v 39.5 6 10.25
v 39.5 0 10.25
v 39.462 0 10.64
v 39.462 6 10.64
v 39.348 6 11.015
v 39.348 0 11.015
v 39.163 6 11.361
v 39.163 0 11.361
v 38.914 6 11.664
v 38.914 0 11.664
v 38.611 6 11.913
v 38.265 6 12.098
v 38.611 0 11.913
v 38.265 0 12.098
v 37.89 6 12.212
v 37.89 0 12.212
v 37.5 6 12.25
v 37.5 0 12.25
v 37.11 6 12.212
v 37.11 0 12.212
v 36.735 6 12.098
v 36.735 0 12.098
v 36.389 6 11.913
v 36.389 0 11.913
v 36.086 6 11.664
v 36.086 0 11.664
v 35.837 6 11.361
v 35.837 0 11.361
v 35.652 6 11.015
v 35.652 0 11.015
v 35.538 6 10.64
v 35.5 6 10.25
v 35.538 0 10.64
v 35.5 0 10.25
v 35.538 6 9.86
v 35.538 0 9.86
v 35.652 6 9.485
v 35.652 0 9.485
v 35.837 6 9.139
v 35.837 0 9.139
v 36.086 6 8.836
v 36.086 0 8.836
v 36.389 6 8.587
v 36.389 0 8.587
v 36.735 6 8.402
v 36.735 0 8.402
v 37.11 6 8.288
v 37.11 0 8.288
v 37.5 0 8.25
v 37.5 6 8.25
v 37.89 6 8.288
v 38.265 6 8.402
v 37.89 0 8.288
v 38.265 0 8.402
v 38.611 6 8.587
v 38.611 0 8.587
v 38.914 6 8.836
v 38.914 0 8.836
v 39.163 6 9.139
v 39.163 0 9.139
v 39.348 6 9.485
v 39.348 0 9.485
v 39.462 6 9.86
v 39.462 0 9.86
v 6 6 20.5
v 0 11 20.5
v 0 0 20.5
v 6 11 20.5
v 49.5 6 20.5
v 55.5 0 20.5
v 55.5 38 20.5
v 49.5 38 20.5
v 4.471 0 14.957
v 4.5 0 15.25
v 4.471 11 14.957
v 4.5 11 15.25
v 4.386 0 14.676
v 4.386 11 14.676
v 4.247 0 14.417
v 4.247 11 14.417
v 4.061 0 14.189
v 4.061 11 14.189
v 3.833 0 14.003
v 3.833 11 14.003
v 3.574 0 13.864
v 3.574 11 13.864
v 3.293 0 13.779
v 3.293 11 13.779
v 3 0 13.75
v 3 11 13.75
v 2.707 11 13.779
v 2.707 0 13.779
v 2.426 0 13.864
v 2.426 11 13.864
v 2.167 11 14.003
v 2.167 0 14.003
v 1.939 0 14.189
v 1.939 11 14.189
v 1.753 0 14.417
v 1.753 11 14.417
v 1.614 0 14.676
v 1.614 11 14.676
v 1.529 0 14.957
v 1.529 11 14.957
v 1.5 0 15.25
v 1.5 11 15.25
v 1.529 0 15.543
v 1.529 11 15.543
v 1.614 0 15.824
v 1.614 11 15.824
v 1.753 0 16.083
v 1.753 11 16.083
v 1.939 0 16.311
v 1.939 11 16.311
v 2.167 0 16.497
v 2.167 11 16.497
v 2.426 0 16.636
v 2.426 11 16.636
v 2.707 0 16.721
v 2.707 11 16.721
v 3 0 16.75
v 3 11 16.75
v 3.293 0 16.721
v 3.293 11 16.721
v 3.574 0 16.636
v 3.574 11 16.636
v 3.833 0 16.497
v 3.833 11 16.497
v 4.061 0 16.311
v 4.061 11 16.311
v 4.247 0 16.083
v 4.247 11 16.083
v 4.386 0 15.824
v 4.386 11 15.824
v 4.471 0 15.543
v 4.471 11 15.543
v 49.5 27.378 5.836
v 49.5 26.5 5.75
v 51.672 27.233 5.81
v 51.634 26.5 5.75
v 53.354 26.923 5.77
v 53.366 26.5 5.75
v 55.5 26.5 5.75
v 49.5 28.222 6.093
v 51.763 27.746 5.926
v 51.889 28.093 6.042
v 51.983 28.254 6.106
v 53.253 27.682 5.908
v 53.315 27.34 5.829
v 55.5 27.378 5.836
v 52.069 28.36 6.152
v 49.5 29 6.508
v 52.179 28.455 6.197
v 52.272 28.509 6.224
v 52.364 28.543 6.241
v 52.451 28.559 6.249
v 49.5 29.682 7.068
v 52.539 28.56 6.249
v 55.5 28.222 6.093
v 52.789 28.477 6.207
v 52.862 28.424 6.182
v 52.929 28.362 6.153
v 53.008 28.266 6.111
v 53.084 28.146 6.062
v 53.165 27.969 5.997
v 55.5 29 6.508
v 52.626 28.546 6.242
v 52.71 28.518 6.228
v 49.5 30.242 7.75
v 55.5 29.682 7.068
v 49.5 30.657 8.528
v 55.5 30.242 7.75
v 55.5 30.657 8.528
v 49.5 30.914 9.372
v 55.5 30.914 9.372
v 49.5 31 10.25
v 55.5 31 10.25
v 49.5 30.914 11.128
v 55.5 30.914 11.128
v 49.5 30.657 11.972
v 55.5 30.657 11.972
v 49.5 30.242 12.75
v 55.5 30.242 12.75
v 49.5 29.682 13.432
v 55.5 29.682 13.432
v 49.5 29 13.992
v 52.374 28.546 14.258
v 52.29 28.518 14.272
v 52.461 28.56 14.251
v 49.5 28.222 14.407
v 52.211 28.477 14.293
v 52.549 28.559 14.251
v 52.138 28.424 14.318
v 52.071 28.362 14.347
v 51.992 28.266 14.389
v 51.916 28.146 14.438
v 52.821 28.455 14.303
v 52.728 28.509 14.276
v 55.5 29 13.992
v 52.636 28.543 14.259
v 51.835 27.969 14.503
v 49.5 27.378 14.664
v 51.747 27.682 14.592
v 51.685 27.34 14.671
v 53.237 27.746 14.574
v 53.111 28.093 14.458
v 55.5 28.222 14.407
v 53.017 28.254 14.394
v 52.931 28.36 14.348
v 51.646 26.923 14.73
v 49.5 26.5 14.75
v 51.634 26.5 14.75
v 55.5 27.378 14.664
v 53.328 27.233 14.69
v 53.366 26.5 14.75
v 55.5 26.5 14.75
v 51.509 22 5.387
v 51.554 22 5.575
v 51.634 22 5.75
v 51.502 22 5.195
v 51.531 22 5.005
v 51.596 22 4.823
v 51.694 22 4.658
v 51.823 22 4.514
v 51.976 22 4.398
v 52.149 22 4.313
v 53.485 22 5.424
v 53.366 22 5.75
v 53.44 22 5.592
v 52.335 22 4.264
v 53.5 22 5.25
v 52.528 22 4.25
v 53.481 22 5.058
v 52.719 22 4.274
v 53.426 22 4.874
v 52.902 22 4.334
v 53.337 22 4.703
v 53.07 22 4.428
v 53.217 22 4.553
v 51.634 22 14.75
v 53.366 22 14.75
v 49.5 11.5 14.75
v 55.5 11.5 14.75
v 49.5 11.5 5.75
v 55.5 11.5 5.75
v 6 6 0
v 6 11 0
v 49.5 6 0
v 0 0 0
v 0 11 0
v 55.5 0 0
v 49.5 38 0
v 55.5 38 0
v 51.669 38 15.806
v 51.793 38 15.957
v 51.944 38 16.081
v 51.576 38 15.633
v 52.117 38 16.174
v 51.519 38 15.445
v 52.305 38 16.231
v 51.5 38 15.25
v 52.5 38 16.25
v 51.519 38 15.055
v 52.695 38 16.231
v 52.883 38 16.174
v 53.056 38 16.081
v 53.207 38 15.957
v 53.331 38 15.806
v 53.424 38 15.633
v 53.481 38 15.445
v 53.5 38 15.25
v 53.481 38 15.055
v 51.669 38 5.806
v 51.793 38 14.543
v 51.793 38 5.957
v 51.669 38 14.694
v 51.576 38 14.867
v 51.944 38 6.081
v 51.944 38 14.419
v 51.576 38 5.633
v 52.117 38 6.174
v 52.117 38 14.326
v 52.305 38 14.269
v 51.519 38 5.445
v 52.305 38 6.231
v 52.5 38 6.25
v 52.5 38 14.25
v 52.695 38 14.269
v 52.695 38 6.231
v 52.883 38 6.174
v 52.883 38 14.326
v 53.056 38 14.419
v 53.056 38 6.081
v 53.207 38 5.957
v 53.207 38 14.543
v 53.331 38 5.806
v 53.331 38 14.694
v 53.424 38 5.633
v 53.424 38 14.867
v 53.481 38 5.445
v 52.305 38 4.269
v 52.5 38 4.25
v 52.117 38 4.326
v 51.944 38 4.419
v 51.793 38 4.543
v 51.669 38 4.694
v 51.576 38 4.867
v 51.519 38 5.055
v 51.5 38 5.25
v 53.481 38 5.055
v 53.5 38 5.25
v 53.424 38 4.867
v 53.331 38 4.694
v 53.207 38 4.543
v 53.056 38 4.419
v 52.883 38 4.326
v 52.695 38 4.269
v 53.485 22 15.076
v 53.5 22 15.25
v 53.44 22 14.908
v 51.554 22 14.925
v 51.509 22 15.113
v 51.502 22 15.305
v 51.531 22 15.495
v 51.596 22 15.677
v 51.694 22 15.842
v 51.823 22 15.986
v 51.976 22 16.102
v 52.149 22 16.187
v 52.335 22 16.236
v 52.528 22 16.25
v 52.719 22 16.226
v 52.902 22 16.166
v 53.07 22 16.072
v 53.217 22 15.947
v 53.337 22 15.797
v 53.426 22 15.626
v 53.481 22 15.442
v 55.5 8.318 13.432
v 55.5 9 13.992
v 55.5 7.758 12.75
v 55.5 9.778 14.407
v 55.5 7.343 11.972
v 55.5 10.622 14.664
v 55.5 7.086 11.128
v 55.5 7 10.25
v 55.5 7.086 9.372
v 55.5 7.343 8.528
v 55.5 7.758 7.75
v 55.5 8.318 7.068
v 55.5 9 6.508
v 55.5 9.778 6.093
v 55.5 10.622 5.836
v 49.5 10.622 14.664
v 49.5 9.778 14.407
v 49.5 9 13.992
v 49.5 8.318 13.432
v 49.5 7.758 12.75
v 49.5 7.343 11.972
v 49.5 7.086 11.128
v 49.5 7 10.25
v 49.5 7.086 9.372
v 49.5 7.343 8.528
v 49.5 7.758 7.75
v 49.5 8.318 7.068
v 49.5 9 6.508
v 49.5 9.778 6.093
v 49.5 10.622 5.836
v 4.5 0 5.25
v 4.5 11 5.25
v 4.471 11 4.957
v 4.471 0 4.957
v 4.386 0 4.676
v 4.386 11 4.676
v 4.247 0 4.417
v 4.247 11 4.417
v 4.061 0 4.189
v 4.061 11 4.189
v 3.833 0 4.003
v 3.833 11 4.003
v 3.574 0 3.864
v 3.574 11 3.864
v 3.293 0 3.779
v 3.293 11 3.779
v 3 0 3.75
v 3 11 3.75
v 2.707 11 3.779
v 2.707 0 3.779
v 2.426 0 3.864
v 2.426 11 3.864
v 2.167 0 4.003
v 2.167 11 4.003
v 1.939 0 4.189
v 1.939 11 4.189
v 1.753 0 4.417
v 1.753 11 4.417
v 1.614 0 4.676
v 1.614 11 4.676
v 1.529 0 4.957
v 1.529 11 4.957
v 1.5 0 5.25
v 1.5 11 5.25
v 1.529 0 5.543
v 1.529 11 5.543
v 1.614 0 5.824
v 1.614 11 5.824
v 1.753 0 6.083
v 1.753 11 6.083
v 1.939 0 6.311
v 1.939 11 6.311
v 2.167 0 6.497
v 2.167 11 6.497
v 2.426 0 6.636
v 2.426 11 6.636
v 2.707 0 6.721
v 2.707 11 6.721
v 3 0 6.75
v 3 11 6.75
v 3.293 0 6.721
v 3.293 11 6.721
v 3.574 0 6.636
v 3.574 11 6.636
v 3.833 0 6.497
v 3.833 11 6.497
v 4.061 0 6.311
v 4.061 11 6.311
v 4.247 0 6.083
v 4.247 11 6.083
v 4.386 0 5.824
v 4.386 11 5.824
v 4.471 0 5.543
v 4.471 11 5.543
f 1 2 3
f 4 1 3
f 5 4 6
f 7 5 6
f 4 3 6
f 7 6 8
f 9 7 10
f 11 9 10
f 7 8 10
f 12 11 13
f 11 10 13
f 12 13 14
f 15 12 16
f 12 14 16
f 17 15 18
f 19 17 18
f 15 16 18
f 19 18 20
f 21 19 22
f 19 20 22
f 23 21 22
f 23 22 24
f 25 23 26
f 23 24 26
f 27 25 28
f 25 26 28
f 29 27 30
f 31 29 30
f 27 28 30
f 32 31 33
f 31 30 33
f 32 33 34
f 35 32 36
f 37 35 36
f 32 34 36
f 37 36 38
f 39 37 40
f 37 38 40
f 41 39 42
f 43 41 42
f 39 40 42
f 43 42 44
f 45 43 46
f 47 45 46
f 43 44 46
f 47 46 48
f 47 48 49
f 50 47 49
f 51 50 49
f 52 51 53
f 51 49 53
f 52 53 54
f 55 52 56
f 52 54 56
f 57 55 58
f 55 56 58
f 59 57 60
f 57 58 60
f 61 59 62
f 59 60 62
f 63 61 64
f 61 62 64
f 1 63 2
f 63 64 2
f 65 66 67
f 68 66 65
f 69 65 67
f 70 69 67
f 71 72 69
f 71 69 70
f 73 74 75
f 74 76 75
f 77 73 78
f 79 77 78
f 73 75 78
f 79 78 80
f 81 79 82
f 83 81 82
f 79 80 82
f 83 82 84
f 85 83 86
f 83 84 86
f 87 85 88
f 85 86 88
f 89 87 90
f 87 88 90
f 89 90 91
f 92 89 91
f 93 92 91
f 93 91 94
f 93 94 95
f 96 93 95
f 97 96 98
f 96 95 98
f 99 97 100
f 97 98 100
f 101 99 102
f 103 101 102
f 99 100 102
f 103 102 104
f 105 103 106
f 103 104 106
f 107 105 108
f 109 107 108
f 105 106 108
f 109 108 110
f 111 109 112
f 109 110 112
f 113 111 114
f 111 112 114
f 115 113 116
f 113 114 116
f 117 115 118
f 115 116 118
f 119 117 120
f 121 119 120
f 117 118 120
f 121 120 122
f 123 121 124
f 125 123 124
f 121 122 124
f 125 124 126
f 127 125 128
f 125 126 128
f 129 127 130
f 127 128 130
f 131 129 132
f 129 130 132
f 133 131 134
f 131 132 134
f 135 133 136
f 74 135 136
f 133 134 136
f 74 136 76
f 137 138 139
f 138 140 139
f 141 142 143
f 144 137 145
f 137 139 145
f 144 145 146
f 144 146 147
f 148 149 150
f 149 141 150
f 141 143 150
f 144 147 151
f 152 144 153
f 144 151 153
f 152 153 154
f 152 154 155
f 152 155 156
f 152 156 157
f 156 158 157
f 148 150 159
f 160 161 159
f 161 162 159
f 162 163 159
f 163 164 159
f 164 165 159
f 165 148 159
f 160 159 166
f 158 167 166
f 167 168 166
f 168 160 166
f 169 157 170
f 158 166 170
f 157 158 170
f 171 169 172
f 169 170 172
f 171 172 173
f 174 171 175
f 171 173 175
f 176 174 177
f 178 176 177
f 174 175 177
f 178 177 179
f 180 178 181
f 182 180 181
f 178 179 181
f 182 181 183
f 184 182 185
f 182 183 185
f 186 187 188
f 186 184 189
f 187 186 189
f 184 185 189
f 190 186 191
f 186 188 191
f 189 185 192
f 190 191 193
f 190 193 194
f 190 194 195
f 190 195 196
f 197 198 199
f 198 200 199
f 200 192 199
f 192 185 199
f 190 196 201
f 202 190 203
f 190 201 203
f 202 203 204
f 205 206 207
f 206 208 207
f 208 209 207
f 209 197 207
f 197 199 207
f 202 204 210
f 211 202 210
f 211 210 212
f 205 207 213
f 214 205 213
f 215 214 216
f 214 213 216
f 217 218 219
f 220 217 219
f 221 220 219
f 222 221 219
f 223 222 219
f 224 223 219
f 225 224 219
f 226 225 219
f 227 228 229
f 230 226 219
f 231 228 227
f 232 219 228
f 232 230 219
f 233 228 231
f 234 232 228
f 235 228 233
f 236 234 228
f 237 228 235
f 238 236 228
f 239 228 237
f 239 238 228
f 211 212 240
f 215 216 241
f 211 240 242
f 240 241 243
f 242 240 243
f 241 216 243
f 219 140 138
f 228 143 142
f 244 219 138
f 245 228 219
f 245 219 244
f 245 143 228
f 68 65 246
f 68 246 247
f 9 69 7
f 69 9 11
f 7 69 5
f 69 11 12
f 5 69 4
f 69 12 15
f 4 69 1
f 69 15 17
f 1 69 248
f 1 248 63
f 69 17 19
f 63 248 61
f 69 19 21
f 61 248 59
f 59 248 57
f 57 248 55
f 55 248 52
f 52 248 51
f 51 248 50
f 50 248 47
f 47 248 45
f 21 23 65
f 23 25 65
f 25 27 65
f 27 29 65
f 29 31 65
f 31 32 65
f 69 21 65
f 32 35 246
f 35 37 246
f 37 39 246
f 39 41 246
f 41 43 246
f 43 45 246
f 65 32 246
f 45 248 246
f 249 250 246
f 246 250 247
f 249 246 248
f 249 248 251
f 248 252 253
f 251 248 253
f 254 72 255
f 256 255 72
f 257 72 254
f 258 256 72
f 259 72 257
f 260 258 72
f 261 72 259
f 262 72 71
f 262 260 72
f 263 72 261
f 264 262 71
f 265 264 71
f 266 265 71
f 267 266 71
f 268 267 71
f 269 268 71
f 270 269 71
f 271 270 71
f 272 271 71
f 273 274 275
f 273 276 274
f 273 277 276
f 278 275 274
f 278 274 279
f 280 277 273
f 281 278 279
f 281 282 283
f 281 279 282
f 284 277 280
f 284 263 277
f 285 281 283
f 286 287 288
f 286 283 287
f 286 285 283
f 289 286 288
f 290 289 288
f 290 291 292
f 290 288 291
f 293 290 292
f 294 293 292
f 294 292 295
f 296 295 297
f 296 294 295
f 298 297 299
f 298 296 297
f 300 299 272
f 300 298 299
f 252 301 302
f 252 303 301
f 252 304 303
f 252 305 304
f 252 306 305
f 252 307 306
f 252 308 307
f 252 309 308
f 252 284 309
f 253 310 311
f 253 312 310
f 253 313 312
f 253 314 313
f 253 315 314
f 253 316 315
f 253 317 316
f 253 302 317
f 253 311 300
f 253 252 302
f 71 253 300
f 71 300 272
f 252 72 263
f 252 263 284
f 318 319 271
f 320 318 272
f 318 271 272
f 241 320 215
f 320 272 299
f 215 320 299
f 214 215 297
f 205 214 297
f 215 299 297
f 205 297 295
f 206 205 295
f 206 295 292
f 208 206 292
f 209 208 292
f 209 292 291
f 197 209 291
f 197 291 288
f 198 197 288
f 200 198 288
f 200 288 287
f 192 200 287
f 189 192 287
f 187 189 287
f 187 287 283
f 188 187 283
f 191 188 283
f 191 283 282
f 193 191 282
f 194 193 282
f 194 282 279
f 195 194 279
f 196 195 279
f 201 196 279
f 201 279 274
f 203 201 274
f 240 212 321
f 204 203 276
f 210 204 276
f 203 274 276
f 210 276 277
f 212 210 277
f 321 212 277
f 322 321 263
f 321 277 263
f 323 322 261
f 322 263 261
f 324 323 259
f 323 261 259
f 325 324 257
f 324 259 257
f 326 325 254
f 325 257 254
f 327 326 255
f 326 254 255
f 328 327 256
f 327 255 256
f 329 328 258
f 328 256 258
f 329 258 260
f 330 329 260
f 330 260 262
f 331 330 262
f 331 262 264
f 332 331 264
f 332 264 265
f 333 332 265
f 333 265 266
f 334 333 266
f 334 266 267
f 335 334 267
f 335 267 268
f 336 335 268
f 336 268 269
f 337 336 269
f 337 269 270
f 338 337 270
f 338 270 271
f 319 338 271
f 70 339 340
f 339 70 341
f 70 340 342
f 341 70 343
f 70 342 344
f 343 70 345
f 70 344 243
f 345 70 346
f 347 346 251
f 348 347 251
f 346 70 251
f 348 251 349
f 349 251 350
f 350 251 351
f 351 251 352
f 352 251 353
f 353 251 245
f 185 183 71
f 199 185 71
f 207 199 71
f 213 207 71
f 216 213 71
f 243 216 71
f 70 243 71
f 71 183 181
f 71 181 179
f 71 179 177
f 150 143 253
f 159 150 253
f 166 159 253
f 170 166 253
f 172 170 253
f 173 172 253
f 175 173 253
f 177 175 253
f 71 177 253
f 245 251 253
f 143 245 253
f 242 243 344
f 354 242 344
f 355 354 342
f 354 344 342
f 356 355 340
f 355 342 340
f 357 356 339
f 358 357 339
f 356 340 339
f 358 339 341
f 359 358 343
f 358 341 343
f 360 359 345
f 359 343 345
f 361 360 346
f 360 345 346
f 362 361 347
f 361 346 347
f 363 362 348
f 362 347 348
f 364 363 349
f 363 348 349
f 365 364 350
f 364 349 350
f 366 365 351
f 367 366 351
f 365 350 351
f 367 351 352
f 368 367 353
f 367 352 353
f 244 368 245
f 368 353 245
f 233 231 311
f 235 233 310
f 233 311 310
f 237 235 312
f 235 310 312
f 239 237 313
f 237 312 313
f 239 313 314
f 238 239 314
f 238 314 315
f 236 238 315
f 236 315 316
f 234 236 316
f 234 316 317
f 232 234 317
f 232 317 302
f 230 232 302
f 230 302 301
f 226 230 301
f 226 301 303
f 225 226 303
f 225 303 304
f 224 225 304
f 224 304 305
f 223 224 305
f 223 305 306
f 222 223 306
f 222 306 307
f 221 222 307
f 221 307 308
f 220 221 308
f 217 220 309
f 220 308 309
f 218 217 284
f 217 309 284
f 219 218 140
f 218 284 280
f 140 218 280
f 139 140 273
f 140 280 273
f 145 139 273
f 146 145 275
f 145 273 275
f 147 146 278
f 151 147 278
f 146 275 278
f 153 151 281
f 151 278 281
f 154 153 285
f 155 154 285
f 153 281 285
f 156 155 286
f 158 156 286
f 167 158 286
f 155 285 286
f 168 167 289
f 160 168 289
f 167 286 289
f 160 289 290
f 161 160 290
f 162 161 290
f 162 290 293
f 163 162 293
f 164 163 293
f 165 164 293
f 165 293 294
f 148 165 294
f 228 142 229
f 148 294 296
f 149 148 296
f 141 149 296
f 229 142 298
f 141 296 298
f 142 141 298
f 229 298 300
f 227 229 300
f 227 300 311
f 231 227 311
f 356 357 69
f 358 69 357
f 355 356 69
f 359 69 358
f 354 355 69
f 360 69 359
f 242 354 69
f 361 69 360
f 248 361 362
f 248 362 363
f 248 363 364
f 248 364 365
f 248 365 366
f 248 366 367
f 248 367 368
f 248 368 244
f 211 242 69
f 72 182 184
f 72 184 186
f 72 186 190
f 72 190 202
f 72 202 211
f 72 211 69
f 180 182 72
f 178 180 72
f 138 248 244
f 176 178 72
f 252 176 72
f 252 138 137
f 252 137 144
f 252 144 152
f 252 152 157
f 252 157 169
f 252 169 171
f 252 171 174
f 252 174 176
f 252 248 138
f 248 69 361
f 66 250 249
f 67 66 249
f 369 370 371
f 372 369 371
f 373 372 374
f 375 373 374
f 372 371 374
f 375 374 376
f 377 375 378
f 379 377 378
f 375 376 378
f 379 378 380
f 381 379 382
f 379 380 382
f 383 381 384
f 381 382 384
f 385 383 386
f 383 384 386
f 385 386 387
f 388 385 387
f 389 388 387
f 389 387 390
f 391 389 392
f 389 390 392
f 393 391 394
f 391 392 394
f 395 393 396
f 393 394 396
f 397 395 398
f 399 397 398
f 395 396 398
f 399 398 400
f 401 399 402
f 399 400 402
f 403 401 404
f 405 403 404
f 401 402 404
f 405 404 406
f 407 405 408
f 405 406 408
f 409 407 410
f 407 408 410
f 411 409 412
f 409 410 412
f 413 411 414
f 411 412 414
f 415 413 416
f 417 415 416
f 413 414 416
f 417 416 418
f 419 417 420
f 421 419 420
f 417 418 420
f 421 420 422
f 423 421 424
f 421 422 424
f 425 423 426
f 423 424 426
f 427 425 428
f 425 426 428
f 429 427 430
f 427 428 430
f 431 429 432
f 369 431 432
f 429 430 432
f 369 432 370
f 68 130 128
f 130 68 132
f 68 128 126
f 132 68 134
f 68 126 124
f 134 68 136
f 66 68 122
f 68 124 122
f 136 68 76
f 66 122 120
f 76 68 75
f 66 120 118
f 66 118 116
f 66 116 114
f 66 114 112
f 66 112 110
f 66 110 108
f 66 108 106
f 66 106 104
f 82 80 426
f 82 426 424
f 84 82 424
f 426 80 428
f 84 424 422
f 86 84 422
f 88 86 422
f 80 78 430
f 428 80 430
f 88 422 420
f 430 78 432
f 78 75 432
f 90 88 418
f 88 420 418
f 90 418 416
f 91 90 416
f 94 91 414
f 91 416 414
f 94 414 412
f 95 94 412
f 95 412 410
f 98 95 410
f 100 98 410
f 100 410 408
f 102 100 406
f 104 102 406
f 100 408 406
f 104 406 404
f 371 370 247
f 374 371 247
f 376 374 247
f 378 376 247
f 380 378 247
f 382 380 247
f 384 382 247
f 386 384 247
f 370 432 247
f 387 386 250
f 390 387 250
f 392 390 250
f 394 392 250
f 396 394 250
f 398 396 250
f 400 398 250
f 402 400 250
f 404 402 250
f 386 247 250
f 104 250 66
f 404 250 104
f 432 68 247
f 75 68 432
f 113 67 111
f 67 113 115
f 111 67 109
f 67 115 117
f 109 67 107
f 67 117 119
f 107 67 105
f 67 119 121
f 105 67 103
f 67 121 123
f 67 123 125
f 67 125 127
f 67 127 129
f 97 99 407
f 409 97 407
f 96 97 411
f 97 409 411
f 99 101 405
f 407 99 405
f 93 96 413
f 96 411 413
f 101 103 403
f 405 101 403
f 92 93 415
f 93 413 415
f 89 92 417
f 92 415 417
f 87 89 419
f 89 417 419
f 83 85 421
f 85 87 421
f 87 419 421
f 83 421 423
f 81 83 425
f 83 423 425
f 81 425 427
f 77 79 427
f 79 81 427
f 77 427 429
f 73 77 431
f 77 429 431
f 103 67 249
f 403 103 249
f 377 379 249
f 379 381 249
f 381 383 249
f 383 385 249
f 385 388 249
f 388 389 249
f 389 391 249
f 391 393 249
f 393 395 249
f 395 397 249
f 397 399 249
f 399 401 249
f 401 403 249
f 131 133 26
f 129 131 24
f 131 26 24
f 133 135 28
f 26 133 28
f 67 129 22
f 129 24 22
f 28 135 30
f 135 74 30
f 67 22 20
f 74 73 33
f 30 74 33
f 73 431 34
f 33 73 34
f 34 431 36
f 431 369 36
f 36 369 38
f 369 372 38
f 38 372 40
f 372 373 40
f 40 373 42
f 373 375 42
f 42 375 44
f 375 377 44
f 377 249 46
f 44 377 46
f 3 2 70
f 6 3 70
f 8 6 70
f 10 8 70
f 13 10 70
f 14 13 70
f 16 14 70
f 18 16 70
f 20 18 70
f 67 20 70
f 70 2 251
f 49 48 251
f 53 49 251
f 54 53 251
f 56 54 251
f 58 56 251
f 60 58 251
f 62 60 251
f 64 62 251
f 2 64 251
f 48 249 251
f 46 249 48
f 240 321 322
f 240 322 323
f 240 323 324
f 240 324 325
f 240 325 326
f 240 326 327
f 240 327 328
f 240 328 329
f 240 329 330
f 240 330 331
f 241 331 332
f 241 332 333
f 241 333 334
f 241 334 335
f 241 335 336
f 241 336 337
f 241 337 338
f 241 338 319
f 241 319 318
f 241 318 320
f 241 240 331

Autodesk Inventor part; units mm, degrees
ref_plane "YZ Plane" through (0, 0, 0) normal (1, 0, 0) x (0, 1, 0)
ref_plane "XZ Plane" through (0, 0, 0) normal (0, 1, 0) x (-1, 0, 0)
ref_plane "XY Plane" through (0, 0, 0) normal (0, 0, 1) x (1, 0, 0)
sketch "Эскиз1" plane through (0, 0, 0) normal (0, 0, 1) x (1, 0, 0)
  line L0 (0, 0) -> (55.5, 0)
  line L1 (55.5, 0) -> (55.5, 6)
  line L2 (55.5, 6) -> (0, 6)
  line L3 (0, 6) -> (0, 0)
  line L4 (0, 6) -> (6, 6)
  line L5 (6, 6) -> (6, 11)
  line L6 (6, 11) -> (0, 11)
  line L7 (0, 11) -> (0, 6)
  line L8 (55.5, 6) -> (49.5, 6)
  line L9 (49.5, 6) -> (49.5, 38)
  line L10 (49.5, 38) -> (55.5, 38)
  line L11 (55.5, 38) -> (55.5, 6)
  dimension "d0" = 38
  dimension "d1" = 6
  dimension "d2" = 6
  dimension "d3" = 6
  dimension "d4" = 11
  dimension "d5" = 55.5
extrude "Выдавливание1" add sketch "Эскиз1" along normal blind 20.5
sketch "Эскиз2" plane through (55.5, 0, 0) normal (1, 0, 0) x (0, 0, -1)
  circle A0 centre (-10.25, 26.5) radius 4.5
  circle A1 centre (-10.25, 11.5) radius 4.5
  line L0 (-5.75, 26.5) -> (-5.75, 11.5)
  line L1 (-14.75, 26.5) -> (-14.75, 11.5)
  line L2 (0, 0) -> (-20.5, 0) projected
  point P0 (-10.25, 0)
  dimension "d8" = 9
  dimension "d9" = 11.5
  dimension "d10" = 24
extrude "Выдавливание2" cut sketch "Эскиз2" against normal up to next
sketch "Эскиз3" plane through (0, 0, 0) normal (0, -1, 0) x (1, 0, 0)
  circle A0 centre (37.5, 10.25) radius 2
  line L0 (55.5, 0) -> (55.5, 20.5) projected
  point P0 (0, 0)
  point P1 (55.5, 10.25)
  dimension "d13" = 4
  dimension "d14" = 18
extrude "Выдавливание3" cut sketch "Эскиз3" against normal up to next
sketch "Эскиз4" plane through (49.5, 38, 0) normal (0, 1, 0) x (1, 0, 0)
  circle A0 centre (3, -15.25) radius 1
  circle A1 centre (3, -5.25) radius 1
  line L0 (0, 0) -> (0, -20.5) projected
  line L1 (6, -20.5) -> (0, -20.5) projected
  line L2 (3, -5.25) -> (3, -15.25) construction
  line L3 (6, 0) -> (6, -20.5) projected
  point P0 (-49.5, 0)
  point P1 (3, -10.25)
  point P2 (6, -10.25)
  dimension "d17" = 2
  dimension "d18" = 10
  dimension "d19" = 2
extrude "Выдавливание4" cut sketch "Эскиз4" against normal blind 16
sketch "Эскиз5" plane through (0, 11, 0) normal (0, 1, 0) x (1, 0, 0)
  circle A0 centre (3, -5.25) radius 1.5
  circle A1 centre (3, -15.25) radius 1.5
  circle A2 centre (52.5, -5.25) radius 1 projected
  circle A3 centre (52.5, -15.25) radius 1 projected
  line L0 (6, 0) -> (0, 0) projected
  point P0 (3, 0)
  dimension "d23" = 3
extrude "Выдавливание5" cut sketch "Эскиз5" against normal up to next contours A0 | A1
properties part number "kreplenie1" material "Пластик АБС"
